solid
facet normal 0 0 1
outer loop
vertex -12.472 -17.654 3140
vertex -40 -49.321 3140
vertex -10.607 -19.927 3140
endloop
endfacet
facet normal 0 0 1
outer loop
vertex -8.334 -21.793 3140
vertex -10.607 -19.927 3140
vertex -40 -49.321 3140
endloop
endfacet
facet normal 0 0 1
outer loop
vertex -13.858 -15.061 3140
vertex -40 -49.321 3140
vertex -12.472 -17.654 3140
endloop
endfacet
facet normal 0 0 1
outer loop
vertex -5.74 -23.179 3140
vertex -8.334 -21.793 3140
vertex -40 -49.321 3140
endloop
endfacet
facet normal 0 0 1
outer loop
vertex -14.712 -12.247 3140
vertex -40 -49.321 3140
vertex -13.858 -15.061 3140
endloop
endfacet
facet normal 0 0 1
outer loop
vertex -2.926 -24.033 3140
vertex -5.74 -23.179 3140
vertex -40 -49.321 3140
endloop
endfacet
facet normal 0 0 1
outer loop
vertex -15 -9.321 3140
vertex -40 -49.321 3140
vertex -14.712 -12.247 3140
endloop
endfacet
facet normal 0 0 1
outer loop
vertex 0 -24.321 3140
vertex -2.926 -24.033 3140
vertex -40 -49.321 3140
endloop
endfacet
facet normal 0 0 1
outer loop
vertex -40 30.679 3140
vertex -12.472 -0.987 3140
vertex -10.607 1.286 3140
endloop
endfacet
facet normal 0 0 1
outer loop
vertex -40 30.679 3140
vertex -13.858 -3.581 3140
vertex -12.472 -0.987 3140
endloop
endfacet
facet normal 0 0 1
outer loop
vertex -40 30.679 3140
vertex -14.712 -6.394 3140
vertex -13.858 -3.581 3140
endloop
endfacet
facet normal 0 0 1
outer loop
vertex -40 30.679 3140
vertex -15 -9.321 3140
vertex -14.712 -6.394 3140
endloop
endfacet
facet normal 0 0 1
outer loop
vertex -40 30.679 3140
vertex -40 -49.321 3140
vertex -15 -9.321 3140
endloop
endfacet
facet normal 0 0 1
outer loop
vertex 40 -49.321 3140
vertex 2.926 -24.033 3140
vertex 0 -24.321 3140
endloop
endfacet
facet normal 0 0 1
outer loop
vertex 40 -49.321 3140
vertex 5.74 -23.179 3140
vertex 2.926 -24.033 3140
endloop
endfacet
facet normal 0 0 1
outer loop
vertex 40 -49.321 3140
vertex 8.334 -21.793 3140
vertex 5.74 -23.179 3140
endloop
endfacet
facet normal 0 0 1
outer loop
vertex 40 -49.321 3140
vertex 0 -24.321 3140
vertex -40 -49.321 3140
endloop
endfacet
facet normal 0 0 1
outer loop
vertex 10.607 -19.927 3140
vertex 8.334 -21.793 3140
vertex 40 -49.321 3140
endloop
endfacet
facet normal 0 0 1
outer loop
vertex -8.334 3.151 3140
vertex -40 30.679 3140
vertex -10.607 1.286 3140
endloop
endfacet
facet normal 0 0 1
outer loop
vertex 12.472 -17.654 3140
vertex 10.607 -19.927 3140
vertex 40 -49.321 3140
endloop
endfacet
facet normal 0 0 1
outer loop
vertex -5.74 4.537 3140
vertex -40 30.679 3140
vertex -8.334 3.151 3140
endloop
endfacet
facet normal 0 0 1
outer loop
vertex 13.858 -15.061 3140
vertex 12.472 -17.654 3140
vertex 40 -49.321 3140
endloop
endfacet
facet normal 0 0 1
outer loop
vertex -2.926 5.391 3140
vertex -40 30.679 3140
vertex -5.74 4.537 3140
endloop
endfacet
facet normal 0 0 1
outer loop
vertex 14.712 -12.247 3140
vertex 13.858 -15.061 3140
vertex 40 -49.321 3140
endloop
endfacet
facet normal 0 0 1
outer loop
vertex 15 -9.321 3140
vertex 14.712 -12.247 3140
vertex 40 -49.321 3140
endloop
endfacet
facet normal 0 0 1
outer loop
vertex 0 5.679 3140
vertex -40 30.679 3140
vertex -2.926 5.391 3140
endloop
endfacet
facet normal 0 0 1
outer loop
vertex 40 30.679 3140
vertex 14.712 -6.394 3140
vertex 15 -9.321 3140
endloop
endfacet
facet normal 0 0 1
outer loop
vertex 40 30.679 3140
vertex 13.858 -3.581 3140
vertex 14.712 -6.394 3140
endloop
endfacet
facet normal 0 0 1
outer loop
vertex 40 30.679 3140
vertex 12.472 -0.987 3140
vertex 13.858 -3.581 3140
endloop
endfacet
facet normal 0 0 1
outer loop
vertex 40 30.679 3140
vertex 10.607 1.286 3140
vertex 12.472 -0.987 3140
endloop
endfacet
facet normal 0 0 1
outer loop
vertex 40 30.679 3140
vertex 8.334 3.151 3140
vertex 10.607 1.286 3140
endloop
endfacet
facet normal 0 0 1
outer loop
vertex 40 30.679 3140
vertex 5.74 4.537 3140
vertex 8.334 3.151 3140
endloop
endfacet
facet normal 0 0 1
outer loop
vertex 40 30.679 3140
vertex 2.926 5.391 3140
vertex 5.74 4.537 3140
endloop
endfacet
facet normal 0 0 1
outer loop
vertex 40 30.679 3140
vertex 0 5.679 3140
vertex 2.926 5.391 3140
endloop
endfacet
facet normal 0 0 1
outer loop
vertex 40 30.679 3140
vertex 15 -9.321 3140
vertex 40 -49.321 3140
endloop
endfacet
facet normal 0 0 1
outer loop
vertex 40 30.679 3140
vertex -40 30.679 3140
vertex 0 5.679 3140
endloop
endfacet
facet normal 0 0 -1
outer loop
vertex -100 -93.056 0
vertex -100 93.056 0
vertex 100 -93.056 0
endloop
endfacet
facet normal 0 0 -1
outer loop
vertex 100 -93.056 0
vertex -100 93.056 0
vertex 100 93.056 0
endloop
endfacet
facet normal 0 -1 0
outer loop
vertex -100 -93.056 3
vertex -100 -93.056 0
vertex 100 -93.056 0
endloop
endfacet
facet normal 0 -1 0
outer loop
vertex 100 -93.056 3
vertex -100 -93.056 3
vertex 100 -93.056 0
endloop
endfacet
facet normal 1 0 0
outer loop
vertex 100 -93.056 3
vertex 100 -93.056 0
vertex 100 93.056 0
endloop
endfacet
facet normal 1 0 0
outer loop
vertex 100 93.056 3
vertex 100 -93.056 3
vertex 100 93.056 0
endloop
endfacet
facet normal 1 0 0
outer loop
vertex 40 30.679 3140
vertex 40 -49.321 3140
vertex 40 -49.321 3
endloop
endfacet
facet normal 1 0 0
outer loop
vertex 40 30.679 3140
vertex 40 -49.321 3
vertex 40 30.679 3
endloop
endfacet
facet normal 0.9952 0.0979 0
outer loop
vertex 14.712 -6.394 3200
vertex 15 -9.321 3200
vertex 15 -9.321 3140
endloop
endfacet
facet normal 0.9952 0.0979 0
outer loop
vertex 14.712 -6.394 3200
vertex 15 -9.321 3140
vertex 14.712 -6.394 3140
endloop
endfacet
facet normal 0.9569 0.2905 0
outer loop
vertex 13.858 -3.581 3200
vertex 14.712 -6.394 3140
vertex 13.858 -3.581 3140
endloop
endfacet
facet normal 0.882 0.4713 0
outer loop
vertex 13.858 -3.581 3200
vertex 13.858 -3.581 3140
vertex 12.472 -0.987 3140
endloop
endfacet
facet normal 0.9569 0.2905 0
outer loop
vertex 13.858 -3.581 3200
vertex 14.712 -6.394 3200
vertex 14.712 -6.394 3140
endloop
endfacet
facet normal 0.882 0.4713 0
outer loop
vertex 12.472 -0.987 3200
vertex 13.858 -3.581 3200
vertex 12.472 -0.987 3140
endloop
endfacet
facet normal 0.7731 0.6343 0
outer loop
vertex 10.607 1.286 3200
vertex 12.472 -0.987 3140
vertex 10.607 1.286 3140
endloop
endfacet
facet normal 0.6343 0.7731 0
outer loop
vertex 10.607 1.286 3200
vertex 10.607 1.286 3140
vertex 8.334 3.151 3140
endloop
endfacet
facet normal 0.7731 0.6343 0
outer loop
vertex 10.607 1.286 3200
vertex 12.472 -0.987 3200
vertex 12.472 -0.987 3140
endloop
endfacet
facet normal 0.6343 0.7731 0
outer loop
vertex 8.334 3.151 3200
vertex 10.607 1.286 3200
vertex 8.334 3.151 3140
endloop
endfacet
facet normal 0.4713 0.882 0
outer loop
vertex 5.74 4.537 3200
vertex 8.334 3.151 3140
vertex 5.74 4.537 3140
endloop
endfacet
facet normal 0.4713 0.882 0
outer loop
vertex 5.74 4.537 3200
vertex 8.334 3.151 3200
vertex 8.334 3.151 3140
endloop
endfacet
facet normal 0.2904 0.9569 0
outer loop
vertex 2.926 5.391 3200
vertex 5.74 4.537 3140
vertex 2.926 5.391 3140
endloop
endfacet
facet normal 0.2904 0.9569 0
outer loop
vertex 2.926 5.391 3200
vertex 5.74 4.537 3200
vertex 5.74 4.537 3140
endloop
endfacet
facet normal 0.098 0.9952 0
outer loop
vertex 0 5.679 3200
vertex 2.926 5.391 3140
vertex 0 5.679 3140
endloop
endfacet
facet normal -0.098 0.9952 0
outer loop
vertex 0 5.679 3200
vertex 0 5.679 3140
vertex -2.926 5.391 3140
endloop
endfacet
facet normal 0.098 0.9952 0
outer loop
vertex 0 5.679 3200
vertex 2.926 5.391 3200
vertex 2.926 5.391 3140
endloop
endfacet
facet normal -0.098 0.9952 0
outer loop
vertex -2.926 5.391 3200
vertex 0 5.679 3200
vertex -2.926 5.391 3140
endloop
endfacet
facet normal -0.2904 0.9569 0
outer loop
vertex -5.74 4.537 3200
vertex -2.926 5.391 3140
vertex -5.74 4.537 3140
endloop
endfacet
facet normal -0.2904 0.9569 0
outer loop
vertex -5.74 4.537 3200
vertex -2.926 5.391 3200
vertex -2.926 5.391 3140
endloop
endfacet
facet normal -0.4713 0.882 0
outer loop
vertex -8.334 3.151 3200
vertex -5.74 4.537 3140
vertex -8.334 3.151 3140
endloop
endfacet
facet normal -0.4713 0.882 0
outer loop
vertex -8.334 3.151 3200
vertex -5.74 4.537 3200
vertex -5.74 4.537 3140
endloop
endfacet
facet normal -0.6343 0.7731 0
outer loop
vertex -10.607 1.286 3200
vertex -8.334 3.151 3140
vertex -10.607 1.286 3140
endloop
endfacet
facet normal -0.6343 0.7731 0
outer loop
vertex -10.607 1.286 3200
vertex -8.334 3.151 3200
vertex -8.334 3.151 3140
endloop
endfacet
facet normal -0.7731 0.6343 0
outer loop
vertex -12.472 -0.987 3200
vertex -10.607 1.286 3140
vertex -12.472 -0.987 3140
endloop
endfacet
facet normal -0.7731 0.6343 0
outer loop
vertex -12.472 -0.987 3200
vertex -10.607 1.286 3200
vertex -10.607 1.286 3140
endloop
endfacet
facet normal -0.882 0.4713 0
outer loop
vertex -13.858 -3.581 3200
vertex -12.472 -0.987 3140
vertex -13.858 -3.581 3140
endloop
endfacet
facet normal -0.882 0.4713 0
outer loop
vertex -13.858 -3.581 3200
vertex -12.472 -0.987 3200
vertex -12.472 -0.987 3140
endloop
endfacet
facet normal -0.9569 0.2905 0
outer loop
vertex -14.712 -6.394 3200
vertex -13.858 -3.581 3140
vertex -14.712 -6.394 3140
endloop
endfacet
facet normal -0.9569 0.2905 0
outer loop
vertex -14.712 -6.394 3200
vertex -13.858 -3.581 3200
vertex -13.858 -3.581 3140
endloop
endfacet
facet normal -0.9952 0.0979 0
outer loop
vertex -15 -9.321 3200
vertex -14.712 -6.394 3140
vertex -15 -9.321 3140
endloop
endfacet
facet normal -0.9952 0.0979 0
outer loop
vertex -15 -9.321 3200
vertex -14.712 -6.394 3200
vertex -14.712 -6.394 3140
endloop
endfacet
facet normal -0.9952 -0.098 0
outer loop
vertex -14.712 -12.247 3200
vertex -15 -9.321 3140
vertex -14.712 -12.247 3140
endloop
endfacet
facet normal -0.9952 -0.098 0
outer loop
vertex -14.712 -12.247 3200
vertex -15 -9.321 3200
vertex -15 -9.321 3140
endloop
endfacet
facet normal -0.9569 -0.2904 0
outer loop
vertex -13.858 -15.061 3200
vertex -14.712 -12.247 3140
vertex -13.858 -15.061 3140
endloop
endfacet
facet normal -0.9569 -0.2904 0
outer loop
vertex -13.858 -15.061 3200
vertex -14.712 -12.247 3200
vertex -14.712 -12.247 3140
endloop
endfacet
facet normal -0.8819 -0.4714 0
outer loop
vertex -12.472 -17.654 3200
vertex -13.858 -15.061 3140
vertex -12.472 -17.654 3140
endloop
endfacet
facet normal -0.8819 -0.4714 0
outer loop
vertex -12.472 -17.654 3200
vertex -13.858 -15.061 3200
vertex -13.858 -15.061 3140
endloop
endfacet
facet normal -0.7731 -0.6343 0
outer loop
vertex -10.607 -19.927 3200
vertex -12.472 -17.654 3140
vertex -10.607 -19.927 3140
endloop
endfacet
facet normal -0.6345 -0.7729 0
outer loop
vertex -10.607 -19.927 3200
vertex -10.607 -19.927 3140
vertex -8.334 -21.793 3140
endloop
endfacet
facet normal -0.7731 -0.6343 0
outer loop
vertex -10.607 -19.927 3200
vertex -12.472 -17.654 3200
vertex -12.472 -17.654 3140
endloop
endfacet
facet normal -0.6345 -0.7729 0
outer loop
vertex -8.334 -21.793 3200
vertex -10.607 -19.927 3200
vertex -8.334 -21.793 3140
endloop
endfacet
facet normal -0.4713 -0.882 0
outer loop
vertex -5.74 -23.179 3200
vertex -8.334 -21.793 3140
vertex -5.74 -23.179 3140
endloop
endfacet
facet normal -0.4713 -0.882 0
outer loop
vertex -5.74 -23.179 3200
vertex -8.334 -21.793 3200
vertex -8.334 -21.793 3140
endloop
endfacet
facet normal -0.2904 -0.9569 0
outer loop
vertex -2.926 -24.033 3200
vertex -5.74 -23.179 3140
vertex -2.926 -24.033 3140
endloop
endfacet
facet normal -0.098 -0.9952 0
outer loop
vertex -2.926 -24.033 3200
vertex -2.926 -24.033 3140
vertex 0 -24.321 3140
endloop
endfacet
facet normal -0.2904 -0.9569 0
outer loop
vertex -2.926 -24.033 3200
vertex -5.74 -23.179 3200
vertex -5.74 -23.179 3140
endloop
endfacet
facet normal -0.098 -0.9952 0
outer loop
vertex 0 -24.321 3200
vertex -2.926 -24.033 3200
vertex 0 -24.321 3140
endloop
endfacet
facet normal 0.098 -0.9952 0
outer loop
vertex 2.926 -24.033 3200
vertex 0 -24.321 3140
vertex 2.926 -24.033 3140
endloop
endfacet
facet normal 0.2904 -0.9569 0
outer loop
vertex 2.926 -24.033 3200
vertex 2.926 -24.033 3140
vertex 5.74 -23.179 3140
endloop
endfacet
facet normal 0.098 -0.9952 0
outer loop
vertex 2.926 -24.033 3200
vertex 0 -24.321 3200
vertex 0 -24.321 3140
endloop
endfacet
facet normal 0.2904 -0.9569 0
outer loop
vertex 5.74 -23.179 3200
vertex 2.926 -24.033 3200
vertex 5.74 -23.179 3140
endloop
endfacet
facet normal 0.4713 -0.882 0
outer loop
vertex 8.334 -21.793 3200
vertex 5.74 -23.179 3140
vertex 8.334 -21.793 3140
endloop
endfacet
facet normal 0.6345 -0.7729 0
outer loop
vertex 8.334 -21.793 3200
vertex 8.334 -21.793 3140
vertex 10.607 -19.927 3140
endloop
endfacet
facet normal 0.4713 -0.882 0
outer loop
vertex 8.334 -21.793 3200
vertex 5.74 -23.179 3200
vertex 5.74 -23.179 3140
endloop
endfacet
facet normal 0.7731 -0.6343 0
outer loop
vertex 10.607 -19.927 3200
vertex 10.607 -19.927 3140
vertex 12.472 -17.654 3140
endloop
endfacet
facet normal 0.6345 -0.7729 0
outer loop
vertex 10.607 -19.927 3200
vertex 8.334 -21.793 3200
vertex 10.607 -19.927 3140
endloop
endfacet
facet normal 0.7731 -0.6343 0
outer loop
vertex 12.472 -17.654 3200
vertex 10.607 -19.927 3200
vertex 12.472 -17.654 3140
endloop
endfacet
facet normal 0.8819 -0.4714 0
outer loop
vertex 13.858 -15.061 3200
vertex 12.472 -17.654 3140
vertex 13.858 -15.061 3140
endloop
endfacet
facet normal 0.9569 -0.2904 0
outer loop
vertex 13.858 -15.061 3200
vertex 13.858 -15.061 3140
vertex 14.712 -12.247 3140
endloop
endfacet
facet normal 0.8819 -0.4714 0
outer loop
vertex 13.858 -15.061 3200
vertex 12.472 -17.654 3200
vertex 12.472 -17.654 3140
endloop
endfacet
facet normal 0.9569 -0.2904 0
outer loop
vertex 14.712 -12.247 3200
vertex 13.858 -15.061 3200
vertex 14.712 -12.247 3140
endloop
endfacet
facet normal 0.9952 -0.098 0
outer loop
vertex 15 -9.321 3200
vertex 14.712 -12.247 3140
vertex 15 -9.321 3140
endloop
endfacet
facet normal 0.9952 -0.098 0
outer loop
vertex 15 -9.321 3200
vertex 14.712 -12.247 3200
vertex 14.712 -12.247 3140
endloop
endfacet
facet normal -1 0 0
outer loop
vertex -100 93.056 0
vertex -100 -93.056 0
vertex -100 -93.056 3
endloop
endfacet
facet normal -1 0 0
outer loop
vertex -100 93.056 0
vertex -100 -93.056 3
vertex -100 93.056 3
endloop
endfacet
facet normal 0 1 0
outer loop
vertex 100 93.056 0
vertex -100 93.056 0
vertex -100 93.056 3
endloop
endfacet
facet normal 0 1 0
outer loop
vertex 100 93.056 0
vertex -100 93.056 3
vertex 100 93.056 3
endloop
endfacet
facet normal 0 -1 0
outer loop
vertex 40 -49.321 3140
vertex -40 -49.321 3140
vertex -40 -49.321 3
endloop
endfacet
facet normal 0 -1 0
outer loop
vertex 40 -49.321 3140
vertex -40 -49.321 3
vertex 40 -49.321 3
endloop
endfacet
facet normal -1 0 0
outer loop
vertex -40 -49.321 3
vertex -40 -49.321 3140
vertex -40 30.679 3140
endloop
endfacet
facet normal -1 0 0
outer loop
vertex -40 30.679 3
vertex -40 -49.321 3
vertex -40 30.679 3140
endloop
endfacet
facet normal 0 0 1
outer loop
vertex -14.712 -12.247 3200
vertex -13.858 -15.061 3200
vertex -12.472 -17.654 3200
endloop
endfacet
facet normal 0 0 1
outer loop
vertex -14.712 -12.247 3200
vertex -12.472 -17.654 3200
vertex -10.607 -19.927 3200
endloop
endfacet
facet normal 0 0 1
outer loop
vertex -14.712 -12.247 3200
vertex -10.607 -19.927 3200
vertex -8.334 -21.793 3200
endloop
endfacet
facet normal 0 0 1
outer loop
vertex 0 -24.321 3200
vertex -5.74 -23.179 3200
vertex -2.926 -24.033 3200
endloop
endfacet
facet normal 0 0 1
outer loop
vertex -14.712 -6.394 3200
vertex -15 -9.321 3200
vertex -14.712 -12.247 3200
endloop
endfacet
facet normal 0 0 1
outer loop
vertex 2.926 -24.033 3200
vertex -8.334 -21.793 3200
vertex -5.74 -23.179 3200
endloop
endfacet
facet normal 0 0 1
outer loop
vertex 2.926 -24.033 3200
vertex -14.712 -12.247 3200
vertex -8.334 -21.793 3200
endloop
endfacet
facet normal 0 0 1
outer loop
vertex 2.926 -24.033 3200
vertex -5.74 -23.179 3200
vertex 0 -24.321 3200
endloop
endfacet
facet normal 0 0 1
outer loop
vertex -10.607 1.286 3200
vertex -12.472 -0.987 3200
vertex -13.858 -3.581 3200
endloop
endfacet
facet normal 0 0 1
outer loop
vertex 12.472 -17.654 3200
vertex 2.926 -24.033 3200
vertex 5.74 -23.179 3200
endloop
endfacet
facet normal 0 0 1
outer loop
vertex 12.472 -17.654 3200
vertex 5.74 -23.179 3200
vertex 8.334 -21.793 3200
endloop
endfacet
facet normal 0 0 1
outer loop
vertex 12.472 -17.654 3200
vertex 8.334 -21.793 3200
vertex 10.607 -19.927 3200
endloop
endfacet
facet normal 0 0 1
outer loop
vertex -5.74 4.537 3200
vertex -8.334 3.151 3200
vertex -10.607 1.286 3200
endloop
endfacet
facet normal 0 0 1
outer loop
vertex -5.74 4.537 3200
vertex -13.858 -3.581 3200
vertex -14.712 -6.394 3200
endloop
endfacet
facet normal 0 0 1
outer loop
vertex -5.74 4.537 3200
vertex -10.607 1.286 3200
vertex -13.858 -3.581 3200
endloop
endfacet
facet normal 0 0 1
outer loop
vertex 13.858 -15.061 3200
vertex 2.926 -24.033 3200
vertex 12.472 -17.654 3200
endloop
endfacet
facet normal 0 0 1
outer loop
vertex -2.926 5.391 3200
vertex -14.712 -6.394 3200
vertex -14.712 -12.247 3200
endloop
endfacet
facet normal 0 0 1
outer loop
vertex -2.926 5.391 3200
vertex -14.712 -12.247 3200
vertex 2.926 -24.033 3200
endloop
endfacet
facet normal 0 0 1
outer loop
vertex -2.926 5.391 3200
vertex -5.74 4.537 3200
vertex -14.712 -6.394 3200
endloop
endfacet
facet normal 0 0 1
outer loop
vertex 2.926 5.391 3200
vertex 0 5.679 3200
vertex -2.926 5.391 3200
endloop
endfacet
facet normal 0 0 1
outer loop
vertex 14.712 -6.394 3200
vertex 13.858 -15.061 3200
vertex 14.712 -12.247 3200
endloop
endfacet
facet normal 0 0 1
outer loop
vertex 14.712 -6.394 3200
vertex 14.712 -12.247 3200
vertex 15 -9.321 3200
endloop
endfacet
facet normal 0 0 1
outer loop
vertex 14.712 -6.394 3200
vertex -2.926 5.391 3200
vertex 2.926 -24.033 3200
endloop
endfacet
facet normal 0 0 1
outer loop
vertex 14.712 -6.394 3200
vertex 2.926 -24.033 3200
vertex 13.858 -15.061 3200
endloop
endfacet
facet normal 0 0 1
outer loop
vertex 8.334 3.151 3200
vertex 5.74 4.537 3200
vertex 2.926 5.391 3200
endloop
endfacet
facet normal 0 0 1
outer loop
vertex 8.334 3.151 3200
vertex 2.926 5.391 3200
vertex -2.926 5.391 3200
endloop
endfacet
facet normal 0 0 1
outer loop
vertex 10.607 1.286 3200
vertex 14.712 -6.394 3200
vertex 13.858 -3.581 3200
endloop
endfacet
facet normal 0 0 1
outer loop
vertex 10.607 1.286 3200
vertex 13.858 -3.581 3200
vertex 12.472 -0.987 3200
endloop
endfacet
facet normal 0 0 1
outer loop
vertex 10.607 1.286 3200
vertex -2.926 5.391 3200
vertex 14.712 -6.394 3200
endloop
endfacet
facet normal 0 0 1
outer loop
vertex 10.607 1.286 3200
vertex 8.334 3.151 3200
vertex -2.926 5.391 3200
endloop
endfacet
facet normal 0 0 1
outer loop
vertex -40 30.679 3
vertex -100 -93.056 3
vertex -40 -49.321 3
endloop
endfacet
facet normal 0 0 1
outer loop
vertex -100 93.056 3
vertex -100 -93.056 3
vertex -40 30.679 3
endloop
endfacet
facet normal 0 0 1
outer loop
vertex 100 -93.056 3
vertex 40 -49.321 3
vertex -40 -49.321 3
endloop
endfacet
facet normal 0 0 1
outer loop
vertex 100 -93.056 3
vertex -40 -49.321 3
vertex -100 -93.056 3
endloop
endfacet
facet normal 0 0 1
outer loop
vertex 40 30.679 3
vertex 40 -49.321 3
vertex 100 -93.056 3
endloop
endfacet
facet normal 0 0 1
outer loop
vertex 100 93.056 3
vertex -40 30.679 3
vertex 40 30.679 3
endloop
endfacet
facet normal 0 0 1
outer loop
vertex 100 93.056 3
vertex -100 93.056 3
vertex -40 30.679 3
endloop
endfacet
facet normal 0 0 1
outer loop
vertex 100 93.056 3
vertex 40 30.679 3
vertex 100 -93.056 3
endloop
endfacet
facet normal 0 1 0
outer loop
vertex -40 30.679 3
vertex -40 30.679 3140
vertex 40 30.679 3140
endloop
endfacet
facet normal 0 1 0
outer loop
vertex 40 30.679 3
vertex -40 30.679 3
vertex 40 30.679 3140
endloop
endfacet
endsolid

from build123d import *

# Parameters (mm, degrees)
F0_W     = 200
F0_H     = 186.111076
F1_DEPTH = 3
F2_W     = 80
F2_H     = 80
F3_DEPTH = 3197
F4_W     = 80
F4_H     = 80
F4_R     = 15
F5_DEPTH = 60


with BuildPart() as f1:
    # F0 (on Top) → F1 (new body)
    with BuildSketch(Plane.XY):
        Rectangle(F0_W, F0_H)
    extrude(amount=F1_DEPTH)

    # F2 (on face) → F3 (join)
    with BuildSketch(Plane.XY.offset(3)):
        with Locations((0, -9.320797)):
            Rectangle(F2_W, F2_H)
    extrude(amount=F3_DEPTH)

    # F4 (on face) → F5 (cut)
    with BuildSketch(Plane.XY.offset(3200)):
        with Locations((0, -9.320797)):
            Rectangle(F4_W, F4_H)
        with Locations((0, -9.320797)):
            Circle(F4_R, mode=Mode.SUBTRACT)
    extrude(amount=-F5_DEPTH, mode=Mode.SUBTRACT)


solid = f1.part
